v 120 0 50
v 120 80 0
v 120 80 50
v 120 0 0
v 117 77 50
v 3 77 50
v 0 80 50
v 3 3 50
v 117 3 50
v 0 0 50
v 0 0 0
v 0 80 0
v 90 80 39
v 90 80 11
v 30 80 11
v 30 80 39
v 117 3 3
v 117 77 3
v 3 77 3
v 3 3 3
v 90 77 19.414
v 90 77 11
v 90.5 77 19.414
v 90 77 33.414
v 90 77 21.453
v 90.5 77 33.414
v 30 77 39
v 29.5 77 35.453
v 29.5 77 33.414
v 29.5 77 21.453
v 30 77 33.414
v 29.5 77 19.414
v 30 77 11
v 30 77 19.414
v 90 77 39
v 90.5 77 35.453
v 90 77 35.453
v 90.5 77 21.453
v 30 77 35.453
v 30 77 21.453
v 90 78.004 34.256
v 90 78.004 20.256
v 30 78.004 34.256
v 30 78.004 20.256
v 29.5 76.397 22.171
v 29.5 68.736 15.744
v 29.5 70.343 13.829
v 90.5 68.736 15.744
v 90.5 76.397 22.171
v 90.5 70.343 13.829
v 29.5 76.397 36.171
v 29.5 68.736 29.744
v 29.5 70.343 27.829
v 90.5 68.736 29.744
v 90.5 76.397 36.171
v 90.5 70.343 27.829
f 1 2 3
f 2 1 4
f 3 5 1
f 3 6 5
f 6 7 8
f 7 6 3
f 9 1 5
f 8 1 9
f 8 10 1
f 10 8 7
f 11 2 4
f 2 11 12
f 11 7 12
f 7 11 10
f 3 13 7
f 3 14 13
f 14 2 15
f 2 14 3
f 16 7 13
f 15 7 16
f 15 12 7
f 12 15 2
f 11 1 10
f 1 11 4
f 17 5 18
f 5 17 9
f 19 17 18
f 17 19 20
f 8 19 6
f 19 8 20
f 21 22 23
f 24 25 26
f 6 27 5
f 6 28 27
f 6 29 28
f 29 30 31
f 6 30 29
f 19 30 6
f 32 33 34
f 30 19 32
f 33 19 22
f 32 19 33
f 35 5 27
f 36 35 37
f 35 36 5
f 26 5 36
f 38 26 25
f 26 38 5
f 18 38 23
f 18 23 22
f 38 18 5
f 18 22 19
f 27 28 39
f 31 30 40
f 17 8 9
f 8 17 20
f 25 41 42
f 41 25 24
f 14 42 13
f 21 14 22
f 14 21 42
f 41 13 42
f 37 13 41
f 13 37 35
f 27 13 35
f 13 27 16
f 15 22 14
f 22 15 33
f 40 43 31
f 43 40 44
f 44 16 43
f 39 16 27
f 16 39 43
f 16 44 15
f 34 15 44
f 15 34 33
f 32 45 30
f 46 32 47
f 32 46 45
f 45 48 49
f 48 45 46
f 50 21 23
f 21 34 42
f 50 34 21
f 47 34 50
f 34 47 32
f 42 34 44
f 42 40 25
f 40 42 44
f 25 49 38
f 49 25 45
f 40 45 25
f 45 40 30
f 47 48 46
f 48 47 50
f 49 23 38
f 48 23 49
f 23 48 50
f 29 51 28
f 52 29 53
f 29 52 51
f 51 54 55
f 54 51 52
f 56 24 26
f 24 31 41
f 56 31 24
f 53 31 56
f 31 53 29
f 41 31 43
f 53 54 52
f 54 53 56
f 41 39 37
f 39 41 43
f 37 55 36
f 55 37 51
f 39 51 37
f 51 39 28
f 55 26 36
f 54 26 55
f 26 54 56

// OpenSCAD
$fn = 32;

// ----------------------------------------------------------------------
// Vent box: louvers enclosure
// ----------------------------------------------------------------------

// --- parameters (mm) ---
box_l = 120;              // box length, X
box_w = 80;               // box width, Y
box_h = 50;               // box height, Z
wall_t = 3;               // shell wall thickness
win_l = 60;               // vent window width, X
win_h = 28;               // vent window height, Z
slat_t = 2.5;             // louver slat thickness
slat_d = 10;              // louver slat depth
slat_a = 40;              // louver slat angle, degrees
slat_pitch = 14;          // louver pitch
slat_yc = 73.37;          // slat centreline Y

win_z0 = (box_h - win_h) / 2;  // window lower edge Z
n_slats = 2;  // louver count
slat_z0 = win_z0 + (win_h - (n_slats - 1) * slat_pitch) / 2;

difference() {
  union() {
    difference() {
      cube([box_l, box_w, box_h]);
  translate([wall_t, wall_t, wall_t])
    cube([box_l - 2 * wall_t, box_w - 2 * wall_t, box_h]);
  translate([(box_l - win_l) / 2, box_w - wall_t - 1, win_z0])
    cube([win_l, wall_t + 2, win_h]);
    }
    for (i = [0 : n_slats - 1])
      translate([box_l / 2, slat_yc, slat_z0 + i * slat_pitch])
        rotate([slat_a, 0, 0])
          cube([win_l + 1, slat_d, slat_t], center = true);
  }
}
